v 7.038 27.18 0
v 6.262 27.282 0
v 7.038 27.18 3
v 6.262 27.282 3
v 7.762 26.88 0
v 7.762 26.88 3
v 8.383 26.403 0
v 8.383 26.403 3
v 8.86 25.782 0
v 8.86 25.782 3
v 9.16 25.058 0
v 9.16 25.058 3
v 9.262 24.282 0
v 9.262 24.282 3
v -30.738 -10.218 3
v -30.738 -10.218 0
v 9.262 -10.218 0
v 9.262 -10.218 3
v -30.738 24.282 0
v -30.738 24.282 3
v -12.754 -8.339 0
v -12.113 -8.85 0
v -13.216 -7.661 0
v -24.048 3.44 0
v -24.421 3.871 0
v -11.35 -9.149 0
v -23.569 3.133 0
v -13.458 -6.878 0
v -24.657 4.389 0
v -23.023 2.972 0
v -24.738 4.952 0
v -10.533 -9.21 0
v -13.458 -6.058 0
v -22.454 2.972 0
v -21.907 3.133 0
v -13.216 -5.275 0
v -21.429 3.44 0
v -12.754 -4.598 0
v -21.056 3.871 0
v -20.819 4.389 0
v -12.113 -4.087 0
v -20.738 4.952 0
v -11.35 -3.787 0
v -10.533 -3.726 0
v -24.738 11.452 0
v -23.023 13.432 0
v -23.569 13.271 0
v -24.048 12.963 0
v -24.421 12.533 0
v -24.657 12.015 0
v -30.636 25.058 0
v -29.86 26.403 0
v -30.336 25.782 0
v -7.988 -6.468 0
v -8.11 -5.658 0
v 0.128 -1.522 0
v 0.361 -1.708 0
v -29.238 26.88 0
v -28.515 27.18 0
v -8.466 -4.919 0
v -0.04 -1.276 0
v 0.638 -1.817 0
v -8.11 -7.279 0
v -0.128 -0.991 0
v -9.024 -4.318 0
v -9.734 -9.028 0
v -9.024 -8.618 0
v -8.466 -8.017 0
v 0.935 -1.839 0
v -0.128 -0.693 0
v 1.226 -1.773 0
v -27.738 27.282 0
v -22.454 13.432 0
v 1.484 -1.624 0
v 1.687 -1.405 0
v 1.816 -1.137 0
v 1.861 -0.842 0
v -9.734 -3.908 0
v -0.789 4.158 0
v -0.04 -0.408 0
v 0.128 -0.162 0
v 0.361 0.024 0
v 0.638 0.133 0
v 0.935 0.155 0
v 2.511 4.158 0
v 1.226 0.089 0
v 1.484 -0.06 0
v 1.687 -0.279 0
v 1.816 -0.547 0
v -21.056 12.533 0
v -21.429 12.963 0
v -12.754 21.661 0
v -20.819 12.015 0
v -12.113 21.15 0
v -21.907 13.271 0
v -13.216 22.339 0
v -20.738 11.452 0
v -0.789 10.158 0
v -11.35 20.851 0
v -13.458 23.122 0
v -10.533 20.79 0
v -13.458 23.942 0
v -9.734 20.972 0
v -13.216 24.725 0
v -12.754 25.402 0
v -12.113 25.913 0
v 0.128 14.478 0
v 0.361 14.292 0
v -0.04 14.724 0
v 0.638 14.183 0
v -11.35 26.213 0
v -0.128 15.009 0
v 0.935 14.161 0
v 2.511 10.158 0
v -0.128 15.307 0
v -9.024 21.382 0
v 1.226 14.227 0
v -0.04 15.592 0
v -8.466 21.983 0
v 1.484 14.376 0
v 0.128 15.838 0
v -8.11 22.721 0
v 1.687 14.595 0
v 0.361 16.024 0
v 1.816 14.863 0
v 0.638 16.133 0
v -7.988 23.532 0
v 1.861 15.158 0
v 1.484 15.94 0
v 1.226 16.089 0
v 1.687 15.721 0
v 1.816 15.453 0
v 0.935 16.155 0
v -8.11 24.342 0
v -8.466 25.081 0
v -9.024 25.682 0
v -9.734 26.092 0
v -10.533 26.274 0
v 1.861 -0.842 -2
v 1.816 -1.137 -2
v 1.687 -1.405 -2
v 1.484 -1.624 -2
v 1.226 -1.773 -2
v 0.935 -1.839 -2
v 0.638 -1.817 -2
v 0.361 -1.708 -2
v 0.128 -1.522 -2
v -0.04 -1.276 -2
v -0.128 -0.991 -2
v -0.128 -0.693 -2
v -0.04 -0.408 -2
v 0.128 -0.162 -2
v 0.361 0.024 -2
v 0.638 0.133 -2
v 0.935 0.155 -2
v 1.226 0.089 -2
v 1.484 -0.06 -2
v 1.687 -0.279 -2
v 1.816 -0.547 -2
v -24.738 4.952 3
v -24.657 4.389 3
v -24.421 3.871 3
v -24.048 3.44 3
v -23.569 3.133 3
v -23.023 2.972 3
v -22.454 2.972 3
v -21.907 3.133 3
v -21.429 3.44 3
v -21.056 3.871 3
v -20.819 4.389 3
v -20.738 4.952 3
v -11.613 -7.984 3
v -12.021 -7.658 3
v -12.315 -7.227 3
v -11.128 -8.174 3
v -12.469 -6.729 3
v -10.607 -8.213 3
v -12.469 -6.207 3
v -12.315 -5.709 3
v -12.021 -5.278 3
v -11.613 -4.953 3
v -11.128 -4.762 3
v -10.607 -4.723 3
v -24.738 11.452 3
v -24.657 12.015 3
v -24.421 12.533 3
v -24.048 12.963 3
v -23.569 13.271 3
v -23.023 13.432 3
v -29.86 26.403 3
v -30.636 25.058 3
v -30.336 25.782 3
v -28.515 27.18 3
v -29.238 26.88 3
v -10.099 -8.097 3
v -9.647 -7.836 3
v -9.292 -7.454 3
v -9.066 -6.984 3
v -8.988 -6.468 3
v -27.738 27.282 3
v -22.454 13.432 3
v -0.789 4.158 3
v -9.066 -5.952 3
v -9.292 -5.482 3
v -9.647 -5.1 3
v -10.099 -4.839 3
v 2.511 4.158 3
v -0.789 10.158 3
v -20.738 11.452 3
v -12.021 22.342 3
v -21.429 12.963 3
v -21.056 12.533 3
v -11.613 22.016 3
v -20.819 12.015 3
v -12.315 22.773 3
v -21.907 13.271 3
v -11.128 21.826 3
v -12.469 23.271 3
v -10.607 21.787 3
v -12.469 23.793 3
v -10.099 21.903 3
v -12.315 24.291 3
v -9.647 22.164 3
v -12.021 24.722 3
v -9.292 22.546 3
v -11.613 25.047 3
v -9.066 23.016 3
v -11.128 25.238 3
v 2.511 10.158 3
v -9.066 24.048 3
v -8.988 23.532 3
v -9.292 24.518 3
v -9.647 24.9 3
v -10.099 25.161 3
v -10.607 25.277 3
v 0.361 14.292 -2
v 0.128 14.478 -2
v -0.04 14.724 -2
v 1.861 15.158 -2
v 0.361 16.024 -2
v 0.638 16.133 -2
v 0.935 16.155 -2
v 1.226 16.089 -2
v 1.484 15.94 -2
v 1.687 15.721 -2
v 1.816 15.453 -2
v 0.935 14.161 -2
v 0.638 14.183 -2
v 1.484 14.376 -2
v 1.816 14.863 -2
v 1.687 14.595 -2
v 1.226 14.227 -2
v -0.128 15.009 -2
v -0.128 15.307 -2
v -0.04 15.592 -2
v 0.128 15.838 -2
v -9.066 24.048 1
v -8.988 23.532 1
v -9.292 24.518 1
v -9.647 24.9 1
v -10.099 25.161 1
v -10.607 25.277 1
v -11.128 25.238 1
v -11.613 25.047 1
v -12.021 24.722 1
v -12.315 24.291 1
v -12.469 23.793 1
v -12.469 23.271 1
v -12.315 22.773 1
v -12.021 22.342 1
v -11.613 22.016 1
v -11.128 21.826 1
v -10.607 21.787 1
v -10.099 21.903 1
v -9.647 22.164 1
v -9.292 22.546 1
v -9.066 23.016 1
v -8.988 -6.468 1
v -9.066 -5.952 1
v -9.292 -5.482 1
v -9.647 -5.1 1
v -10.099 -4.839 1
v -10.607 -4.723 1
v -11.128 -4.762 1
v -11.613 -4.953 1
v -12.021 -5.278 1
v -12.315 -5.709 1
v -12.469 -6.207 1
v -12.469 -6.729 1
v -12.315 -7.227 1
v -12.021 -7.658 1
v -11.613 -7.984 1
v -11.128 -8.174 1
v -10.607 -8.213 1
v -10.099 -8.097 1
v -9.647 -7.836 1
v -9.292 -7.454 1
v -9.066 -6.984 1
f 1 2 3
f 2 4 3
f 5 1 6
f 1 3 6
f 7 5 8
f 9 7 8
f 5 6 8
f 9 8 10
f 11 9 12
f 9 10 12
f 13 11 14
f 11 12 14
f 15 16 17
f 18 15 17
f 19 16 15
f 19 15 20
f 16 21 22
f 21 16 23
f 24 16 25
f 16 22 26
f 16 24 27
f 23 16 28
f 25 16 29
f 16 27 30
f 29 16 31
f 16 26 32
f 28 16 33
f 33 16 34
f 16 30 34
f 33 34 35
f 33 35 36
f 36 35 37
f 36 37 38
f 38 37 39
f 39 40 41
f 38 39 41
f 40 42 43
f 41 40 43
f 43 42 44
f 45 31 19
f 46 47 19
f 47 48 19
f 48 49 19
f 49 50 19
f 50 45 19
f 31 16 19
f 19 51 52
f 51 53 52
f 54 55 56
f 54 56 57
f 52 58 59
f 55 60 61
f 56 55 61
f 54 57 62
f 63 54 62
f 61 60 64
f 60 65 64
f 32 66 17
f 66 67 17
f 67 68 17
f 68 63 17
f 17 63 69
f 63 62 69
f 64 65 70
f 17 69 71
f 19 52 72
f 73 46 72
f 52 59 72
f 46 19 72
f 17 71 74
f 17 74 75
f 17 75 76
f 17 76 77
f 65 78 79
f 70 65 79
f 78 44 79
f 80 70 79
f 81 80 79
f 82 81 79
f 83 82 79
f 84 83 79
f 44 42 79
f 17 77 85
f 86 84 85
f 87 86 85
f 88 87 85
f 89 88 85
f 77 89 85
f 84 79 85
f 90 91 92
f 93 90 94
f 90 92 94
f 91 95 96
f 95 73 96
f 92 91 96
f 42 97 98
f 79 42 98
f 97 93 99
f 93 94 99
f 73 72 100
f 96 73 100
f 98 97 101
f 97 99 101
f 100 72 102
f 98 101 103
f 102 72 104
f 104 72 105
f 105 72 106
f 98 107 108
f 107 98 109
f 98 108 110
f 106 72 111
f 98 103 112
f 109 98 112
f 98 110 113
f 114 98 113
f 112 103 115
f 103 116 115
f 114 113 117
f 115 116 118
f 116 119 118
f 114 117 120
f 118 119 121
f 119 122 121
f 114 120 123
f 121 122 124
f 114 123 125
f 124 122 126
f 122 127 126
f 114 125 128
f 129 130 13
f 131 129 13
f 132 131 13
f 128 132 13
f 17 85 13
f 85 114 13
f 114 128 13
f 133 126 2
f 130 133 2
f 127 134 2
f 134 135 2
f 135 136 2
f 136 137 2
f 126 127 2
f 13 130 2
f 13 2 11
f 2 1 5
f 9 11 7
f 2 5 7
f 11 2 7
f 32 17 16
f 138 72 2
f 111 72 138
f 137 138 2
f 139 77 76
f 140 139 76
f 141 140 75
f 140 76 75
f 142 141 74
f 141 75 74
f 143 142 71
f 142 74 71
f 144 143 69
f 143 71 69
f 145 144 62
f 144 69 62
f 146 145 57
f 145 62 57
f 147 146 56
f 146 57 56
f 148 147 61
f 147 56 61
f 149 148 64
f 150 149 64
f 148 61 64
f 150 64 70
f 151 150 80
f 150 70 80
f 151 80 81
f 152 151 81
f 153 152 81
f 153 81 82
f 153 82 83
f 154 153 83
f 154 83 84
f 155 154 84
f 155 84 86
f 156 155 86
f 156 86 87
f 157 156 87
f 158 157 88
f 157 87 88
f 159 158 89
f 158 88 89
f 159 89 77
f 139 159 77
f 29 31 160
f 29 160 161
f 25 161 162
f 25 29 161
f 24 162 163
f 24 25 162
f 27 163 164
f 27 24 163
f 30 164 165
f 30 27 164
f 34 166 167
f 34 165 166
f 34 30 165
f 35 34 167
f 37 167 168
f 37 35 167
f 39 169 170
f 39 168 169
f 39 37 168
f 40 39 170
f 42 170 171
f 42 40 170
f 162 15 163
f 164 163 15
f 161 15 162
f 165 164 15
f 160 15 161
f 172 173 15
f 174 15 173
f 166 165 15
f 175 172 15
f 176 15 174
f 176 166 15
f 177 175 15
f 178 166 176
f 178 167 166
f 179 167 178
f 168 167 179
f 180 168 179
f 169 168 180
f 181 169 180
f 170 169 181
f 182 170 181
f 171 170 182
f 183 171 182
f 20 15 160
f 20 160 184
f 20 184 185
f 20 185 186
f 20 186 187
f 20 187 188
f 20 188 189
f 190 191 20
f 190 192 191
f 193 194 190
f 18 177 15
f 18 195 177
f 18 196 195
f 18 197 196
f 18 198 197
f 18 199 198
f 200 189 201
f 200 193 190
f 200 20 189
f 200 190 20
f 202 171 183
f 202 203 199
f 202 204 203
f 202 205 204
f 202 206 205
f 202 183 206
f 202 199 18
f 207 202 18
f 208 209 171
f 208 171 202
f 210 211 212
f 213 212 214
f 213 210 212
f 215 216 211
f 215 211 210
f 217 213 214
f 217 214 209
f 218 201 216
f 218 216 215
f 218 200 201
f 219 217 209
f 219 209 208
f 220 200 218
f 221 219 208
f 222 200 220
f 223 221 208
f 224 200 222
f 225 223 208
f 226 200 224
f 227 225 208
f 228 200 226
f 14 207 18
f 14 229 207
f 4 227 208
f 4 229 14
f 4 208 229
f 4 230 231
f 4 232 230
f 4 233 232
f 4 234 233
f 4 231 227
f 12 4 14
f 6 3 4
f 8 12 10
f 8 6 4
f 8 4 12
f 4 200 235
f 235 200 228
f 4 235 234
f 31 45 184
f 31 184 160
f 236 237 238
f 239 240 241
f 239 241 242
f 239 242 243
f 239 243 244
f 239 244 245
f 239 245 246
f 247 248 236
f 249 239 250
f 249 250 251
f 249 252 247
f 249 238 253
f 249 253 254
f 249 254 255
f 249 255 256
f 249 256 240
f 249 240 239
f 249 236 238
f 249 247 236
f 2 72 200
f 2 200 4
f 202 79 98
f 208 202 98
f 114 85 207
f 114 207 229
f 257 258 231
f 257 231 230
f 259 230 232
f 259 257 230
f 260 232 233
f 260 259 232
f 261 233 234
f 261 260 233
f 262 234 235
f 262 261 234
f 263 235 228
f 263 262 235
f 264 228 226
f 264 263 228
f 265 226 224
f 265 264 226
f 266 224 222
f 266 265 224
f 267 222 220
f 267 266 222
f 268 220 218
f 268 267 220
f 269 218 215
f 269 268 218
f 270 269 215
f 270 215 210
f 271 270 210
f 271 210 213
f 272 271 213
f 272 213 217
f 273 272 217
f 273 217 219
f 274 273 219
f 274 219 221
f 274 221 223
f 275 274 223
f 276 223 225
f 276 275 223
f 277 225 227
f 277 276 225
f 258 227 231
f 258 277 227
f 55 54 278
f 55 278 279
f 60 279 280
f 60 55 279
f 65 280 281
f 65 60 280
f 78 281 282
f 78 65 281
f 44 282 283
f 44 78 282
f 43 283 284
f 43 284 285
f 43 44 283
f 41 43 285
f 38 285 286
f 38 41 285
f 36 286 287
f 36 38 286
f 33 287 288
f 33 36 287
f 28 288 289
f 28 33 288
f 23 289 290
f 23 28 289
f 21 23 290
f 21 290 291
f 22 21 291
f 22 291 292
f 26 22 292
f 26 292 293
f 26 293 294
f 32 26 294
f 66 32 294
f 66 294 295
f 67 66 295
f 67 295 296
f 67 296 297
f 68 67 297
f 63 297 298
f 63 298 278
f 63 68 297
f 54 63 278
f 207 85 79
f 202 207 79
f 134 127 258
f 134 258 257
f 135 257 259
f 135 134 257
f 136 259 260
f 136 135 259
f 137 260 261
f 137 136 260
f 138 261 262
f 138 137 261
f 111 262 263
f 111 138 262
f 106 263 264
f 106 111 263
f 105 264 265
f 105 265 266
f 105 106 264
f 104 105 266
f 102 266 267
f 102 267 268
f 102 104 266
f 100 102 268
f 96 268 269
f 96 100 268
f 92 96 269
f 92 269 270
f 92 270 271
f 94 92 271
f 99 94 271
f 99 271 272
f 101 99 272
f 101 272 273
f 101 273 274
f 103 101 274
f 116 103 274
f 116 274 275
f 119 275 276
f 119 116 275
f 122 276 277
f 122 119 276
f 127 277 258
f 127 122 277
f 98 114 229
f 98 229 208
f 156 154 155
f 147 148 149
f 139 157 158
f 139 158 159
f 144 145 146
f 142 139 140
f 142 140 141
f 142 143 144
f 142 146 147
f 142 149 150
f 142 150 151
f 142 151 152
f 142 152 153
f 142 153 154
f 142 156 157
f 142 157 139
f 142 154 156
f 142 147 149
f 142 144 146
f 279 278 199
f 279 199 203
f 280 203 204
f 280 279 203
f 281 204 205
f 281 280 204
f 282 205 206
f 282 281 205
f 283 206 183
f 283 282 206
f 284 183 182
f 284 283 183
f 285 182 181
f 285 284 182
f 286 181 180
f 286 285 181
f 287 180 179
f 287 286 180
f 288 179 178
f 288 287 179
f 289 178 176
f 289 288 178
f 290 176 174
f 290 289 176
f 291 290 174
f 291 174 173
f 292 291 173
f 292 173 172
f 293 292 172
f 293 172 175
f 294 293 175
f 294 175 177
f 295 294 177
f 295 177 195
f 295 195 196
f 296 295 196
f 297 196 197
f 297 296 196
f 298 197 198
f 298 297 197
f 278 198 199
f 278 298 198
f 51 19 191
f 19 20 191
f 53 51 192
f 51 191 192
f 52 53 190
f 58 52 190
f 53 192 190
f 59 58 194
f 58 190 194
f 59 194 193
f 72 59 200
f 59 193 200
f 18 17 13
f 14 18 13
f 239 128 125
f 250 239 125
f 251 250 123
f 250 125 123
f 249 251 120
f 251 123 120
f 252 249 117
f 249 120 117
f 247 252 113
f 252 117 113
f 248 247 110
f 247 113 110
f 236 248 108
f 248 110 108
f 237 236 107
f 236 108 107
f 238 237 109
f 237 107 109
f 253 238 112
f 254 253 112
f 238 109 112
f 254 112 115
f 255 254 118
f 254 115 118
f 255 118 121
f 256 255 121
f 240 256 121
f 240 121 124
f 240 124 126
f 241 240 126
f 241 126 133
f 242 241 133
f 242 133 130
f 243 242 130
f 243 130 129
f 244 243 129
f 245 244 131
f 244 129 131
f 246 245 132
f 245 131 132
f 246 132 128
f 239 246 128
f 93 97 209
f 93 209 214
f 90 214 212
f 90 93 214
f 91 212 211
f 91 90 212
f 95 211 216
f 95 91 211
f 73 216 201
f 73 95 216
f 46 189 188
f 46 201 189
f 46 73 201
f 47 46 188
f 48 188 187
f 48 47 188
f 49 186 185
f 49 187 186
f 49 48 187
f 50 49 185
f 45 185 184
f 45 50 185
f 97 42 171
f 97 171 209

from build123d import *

# Parameters (mm, degrees)
ESQUISSE1_W             = 40
ESQUISSE1_H             = 37.5
ESQUISSE1_R             = 1.75
BOSS_EXTRU_1_DEPTH      = 3
CHANFREIN1_SIZE         = 1
CONG_1_R                = 3
ESQUISSE5_W             = 3.3
ESQUISSE5_H             = 6
ENL_V_MAT_EXTRU_2_DEPTH = 42.208509496
ESQUISSE6_R             = 1
BOSS_EXTRU_2_DEPTH      = 2


with BuildPart() as part:
    # Esquisse1 → Boss.-Extru.1 (new body)
    with BuildSketch(Plane.XY):
        with Locations((-10.738255034, 8.531879195)):
            Rectangle(ESQUISSE1_W, ESQUISSE1_H)
        with Locations((-10.738255034, -6.468120805)):
            Circle(ESQUISSE1_R, mode=Mode.SUBTRACT)
        with Locations((-10.738255034, 23.531879195)):
            Circle(ESQUISSE1_R, mode=Mode.SUBTRACT)
    extrude(amount=BOSS_EXTRU_1_DEPTH)

    # Chanfrein1
    chanfrein1_edges = [part.edges().sort_by_distance(p)[0] for p in [
        (-12.488255034, -6.468120805, 0),
        (-12.488255034, 23.531879195, 0),
    ]]
    chamfer(chanfrein1_edges, length=CHANFREIN1_SIZE)

    # Congé1
    cong_1_edges = [part.edges().sort_by_distance(p)[0] for p in [
        (-30.738255034, 27.281879195, 1.5),
        (9.261744966, 27.281879195, 1.5),
    ]]
    fillet(cong_1_edges, radius=CONG_1_R)

    # Esquisse5 → Enlèv. mat.-Extru.2 (cut, through all)
    with BuildSketch(Plane(origin=(0, 0, 0), x_dir=(-1, 0, 0), z_dir=(0, 0, -1))):
        with BuildLine():
            Line((24.738255034, 11.451981866), (24.738255034, 4.951981866))
            ThreePointArc((24.738255034, 4.951981866), (22.738255034, 2.951981866), (20.738255034, 4.951981866))
            Line((20.738255034, 4.951981866), (20.738255034, 11.451981866))
            ThreePointArc((20.738255034, 11.451981866), (22.738255034, 13.451981866), (24.738255034, 11.451981866))
        make_face()
        with Locations((-0.860681094, 7.158115812)):
            Rectangle(ESQUISSE5_W, ESQUISSE5_H)
    extrude(amount=-ENL_V_MAT_EXTRU_2_DEPTH, mode=Mode.SUBTRACT)

    # Esquisse6 → Boss.-Extru.2 (add)
    with BuildSketch(Plane(origin=(0, 0, 0), x_dir=(-1, 0, 0), z_dir=(0, 0, -1))):
        with Locations(Location((-0.860681094, 15.158115812, 0), (0, 0, 180))):
            Circle(ESQUISSE6_R)
        with Locations(Location((-0.860681094, -0.841884188, 0), (0, 0, 180))):
            Circle(ESQUISSE6_R)
    extrude(amount=BOSS_EXTRU_2_DEPTH)


solid = part.part
